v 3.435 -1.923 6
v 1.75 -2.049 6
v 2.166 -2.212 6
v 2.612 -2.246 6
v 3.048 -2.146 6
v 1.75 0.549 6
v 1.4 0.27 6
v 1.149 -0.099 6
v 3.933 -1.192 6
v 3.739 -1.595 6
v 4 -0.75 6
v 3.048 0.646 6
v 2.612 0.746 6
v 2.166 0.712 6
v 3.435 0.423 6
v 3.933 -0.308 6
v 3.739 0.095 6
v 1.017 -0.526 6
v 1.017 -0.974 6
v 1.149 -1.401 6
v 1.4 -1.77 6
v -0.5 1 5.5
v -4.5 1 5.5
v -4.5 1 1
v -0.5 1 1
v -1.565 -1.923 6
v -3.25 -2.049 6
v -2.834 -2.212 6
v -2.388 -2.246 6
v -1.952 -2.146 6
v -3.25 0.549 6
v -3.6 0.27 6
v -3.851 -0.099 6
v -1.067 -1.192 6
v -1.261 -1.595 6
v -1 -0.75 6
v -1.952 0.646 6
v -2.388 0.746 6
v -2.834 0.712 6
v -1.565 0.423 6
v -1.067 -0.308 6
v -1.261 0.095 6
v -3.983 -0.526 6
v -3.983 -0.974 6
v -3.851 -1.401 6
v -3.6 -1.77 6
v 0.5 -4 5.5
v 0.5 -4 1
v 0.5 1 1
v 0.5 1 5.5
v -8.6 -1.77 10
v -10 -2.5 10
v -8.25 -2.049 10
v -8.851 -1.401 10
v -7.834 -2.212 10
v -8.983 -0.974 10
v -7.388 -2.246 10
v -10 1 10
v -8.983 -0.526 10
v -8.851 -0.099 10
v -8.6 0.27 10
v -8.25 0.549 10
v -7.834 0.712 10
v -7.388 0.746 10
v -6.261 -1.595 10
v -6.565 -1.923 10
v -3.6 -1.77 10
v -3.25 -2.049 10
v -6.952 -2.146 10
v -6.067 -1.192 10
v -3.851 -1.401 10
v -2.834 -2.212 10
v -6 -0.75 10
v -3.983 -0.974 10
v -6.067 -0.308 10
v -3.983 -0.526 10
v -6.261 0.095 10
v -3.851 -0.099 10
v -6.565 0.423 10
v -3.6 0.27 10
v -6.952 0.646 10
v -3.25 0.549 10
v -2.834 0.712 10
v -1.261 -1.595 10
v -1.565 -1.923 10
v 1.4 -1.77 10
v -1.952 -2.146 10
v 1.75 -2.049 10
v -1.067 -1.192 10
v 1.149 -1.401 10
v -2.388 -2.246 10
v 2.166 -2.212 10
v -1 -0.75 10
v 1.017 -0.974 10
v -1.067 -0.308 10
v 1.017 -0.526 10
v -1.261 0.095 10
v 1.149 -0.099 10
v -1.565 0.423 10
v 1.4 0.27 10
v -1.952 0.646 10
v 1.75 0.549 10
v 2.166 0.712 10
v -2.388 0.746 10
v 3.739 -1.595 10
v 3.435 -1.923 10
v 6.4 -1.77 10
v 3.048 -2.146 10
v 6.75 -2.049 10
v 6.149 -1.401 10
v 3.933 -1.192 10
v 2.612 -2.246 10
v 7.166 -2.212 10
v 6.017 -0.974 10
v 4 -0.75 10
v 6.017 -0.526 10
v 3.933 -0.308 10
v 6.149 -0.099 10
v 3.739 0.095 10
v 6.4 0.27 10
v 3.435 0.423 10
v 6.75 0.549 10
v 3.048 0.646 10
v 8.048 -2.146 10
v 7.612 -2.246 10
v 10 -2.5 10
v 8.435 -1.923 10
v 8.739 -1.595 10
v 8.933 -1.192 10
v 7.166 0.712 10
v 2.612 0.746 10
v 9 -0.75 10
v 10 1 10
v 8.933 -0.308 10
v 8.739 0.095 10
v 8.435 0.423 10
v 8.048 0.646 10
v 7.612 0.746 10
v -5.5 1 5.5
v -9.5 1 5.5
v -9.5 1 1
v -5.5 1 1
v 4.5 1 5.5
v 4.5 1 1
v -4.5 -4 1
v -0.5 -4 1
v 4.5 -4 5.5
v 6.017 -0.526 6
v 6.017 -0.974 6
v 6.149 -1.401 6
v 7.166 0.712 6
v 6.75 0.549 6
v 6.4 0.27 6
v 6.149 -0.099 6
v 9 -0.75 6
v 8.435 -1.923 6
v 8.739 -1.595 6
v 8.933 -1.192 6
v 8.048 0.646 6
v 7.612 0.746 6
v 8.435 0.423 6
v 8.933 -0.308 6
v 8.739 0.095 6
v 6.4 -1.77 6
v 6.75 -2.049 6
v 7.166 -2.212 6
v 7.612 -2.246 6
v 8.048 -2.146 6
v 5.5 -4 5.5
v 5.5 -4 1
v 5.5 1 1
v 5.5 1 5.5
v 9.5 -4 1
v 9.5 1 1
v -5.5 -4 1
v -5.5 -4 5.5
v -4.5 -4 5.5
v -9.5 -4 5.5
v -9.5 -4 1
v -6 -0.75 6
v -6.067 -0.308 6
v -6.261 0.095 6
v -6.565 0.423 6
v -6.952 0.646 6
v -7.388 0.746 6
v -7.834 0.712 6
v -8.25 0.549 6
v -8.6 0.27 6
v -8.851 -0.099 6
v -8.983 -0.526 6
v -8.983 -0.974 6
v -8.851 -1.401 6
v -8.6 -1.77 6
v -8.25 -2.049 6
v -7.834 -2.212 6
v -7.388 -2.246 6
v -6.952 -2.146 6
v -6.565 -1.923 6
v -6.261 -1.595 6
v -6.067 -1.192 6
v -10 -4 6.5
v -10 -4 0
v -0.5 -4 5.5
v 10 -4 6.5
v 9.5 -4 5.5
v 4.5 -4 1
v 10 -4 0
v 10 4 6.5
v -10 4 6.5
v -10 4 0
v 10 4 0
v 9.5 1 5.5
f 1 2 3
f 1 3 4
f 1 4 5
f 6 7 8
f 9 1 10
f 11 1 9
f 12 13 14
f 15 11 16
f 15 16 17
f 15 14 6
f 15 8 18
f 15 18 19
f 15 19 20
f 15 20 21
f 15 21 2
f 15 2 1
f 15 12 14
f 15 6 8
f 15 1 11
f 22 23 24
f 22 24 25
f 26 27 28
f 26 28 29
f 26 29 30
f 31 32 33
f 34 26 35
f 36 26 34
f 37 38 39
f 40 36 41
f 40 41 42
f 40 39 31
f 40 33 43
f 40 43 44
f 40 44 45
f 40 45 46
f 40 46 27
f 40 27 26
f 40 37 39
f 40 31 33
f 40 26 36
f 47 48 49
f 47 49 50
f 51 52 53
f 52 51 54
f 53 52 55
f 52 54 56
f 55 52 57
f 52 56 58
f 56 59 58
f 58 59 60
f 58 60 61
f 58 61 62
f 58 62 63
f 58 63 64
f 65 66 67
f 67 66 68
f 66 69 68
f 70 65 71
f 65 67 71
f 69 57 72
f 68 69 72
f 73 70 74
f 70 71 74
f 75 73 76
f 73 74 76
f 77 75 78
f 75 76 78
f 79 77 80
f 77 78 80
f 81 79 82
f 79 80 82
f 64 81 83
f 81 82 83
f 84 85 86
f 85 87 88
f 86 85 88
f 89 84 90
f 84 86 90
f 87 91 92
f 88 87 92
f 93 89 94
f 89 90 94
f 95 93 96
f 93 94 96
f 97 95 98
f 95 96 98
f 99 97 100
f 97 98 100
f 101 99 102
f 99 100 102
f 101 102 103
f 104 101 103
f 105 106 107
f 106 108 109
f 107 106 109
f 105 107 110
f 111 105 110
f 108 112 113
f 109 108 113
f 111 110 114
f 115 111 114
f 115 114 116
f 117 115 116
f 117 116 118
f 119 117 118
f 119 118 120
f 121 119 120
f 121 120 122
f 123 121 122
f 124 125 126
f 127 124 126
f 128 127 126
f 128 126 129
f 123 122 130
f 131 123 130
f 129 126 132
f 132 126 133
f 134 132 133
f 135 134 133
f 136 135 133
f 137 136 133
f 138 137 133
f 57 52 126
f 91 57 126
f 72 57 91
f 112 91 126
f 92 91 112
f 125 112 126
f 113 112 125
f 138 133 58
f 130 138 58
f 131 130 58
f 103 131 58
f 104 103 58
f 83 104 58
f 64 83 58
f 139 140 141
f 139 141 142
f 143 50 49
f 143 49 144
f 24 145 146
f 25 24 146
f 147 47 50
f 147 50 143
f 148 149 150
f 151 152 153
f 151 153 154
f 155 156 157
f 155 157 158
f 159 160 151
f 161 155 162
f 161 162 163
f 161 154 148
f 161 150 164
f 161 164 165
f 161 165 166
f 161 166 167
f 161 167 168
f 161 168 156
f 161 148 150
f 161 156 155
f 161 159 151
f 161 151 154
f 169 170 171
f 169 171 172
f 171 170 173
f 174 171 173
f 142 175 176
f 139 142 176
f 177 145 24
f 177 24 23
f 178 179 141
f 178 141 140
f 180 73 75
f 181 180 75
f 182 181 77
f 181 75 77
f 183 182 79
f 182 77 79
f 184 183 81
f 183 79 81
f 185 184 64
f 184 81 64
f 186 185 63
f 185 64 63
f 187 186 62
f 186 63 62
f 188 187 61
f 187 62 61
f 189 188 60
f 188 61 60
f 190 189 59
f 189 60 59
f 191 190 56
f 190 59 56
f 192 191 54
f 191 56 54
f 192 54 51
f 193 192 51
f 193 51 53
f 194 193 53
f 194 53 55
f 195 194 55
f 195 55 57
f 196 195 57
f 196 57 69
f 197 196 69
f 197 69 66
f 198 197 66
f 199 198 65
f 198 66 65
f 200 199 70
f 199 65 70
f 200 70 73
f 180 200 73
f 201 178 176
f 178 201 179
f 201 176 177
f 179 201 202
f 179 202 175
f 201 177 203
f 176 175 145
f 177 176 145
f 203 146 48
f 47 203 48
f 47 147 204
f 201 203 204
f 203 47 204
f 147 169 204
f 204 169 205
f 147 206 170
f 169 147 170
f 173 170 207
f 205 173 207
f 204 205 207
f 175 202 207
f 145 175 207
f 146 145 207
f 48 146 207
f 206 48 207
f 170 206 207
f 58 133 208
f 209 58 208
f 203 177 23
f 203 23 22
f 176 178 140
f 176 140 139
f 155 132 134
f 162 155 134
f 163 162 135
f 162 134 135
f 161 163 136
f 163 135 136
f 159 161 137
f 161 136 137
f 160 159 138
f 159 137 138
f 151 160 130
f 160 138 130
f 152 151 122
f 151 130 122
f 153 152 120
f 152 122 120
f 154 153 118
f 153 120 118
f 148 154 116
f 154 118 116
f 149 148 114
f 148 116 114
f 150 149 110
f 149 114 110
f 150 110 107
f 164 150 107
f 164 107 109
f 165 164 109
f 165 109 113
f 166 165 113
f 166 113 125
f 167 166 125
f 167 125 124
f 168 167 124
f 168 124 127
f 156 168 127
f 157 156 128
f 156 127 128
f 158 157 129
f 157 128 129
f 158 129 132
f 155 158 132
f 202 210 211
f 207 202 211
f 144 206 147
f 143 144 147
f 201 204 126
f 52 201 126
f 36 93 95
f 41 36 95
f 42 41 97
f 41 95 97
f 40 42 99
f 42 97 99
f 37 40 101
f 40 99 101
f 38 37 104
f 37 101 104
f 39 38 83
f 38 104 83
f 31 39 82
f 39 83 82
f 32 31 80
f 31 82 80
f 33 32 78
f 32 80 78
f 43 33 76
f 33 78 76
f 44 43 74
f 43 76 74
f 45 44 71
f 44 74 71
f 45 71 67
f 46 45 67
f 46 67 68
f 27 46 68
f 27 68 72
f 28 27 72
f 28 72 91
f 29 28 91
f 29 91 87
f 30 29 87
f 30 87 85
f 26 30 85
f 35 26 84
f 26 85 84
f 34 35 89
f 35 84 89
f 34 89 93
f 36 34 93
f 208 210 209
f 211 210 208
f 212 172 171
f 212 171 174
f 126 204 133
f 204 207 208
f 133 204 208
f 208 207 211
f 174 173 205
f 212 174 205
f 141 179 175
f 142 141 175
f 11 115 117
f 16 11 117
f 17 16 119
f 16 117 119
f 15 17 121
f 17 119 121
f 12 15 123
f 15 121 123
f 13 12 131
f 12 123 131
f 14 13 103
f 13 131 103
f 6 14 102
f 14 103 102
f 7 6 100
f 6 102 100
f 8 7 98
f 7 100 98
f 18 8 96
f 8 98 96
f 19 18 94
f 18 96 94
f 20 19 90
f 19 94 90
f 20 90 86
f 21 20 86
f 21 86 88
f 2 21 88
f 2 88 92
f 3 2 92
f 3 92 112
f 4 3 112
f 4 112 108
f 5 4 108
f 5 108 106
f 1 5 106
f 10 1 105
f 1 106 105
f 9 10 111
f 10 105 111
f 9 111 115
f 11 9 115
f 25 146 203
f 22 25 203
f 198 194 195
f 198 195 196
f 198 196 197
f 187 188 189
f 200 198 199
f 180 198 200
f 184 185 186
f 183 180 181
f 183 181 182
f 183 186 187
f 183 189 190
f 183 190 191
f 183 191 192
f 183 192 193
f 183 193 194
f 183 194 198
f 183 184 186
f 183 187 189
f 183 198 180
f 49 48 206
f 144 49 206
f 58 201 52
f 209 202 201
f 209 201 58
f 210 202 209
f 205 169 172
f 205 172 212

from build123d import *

# Parameters (mm, degrees)
SKETCH040_W     = 20
SKETCH040_H     = 8
PAD021_DEPTH    = 10
POCKET019_DEPTH = 20
SKETCH042_R     = 1.5
POCKET020_DEPTH = 4
SKETCH043_W     = 4
SKETCH043_H     = 4.5
POCKET021_DEPTH = 5


with BuildPart() as part:
    # Sketch040 → Pad021 (new body)
    with BuildSketch(Plane.XY):
        Rectangle(SKETCH040_W, SKETCH040_H)
    extrude(amount=PAD021_DEPTH)

    # Sketch041 (on Face2 of Pad021) → Pocket019 (cut)
    with BuildSketch(Plane.YZ.offset(10)):
        Polygon((-4, 6.5), (-2.5, 10), (1, 10), (4, 6.5), (5, 6.5), (5, 11), (-5, 11), (-5, 6.5), align=None)
    extrude(amount=-POCKET019_DEPTH, mode=Mode.SUBTRACT)

    # Sketch042 (on Face8 of Pocket019) → Pocket020 (cut)
    with BuildSketch(Plane.XY.offset(10)):
        with Locations((-7.5, -0.75)):
            Circle(SKETCH042_R)
        with Locations((-2.5, -0.75)):
            Circle(SKETCH042_R)
        with Locations((2.5, -0.75)):
            Circle(SKETCH042_R)
        with Locations((7.5, -0.75)):
            Circle(SKETCH042_R)
    extrude(amount=-POCKET020_DEPTH, mode=Mode.SUBTRACT)

    # Sketch043 (on Face6 of Pocket020) → Pocket021 (cut)
    with BuildSketch(Plane.XZ.offset(4)):
        with Locations((-7.5, 3.25)):
            Rectangle(SKETCH043_W, SKETCH043_H)
        with Locations((-2.5, 3.25)):
            Rectangle(SKETCH043_W, SKETCH043_H)
        with Locations((2.5, 3.25)):
            Rectangle(SKETCH043_W, SKETCH043_H)
        with Locations((7.5, 3.25)):
            Rectangle(SKETCH043_W, SKETCH043_H)
    extrude(amount=-POCKET021_DEPTH, mode=Mode.SUBTRACT)


solid = part.part
